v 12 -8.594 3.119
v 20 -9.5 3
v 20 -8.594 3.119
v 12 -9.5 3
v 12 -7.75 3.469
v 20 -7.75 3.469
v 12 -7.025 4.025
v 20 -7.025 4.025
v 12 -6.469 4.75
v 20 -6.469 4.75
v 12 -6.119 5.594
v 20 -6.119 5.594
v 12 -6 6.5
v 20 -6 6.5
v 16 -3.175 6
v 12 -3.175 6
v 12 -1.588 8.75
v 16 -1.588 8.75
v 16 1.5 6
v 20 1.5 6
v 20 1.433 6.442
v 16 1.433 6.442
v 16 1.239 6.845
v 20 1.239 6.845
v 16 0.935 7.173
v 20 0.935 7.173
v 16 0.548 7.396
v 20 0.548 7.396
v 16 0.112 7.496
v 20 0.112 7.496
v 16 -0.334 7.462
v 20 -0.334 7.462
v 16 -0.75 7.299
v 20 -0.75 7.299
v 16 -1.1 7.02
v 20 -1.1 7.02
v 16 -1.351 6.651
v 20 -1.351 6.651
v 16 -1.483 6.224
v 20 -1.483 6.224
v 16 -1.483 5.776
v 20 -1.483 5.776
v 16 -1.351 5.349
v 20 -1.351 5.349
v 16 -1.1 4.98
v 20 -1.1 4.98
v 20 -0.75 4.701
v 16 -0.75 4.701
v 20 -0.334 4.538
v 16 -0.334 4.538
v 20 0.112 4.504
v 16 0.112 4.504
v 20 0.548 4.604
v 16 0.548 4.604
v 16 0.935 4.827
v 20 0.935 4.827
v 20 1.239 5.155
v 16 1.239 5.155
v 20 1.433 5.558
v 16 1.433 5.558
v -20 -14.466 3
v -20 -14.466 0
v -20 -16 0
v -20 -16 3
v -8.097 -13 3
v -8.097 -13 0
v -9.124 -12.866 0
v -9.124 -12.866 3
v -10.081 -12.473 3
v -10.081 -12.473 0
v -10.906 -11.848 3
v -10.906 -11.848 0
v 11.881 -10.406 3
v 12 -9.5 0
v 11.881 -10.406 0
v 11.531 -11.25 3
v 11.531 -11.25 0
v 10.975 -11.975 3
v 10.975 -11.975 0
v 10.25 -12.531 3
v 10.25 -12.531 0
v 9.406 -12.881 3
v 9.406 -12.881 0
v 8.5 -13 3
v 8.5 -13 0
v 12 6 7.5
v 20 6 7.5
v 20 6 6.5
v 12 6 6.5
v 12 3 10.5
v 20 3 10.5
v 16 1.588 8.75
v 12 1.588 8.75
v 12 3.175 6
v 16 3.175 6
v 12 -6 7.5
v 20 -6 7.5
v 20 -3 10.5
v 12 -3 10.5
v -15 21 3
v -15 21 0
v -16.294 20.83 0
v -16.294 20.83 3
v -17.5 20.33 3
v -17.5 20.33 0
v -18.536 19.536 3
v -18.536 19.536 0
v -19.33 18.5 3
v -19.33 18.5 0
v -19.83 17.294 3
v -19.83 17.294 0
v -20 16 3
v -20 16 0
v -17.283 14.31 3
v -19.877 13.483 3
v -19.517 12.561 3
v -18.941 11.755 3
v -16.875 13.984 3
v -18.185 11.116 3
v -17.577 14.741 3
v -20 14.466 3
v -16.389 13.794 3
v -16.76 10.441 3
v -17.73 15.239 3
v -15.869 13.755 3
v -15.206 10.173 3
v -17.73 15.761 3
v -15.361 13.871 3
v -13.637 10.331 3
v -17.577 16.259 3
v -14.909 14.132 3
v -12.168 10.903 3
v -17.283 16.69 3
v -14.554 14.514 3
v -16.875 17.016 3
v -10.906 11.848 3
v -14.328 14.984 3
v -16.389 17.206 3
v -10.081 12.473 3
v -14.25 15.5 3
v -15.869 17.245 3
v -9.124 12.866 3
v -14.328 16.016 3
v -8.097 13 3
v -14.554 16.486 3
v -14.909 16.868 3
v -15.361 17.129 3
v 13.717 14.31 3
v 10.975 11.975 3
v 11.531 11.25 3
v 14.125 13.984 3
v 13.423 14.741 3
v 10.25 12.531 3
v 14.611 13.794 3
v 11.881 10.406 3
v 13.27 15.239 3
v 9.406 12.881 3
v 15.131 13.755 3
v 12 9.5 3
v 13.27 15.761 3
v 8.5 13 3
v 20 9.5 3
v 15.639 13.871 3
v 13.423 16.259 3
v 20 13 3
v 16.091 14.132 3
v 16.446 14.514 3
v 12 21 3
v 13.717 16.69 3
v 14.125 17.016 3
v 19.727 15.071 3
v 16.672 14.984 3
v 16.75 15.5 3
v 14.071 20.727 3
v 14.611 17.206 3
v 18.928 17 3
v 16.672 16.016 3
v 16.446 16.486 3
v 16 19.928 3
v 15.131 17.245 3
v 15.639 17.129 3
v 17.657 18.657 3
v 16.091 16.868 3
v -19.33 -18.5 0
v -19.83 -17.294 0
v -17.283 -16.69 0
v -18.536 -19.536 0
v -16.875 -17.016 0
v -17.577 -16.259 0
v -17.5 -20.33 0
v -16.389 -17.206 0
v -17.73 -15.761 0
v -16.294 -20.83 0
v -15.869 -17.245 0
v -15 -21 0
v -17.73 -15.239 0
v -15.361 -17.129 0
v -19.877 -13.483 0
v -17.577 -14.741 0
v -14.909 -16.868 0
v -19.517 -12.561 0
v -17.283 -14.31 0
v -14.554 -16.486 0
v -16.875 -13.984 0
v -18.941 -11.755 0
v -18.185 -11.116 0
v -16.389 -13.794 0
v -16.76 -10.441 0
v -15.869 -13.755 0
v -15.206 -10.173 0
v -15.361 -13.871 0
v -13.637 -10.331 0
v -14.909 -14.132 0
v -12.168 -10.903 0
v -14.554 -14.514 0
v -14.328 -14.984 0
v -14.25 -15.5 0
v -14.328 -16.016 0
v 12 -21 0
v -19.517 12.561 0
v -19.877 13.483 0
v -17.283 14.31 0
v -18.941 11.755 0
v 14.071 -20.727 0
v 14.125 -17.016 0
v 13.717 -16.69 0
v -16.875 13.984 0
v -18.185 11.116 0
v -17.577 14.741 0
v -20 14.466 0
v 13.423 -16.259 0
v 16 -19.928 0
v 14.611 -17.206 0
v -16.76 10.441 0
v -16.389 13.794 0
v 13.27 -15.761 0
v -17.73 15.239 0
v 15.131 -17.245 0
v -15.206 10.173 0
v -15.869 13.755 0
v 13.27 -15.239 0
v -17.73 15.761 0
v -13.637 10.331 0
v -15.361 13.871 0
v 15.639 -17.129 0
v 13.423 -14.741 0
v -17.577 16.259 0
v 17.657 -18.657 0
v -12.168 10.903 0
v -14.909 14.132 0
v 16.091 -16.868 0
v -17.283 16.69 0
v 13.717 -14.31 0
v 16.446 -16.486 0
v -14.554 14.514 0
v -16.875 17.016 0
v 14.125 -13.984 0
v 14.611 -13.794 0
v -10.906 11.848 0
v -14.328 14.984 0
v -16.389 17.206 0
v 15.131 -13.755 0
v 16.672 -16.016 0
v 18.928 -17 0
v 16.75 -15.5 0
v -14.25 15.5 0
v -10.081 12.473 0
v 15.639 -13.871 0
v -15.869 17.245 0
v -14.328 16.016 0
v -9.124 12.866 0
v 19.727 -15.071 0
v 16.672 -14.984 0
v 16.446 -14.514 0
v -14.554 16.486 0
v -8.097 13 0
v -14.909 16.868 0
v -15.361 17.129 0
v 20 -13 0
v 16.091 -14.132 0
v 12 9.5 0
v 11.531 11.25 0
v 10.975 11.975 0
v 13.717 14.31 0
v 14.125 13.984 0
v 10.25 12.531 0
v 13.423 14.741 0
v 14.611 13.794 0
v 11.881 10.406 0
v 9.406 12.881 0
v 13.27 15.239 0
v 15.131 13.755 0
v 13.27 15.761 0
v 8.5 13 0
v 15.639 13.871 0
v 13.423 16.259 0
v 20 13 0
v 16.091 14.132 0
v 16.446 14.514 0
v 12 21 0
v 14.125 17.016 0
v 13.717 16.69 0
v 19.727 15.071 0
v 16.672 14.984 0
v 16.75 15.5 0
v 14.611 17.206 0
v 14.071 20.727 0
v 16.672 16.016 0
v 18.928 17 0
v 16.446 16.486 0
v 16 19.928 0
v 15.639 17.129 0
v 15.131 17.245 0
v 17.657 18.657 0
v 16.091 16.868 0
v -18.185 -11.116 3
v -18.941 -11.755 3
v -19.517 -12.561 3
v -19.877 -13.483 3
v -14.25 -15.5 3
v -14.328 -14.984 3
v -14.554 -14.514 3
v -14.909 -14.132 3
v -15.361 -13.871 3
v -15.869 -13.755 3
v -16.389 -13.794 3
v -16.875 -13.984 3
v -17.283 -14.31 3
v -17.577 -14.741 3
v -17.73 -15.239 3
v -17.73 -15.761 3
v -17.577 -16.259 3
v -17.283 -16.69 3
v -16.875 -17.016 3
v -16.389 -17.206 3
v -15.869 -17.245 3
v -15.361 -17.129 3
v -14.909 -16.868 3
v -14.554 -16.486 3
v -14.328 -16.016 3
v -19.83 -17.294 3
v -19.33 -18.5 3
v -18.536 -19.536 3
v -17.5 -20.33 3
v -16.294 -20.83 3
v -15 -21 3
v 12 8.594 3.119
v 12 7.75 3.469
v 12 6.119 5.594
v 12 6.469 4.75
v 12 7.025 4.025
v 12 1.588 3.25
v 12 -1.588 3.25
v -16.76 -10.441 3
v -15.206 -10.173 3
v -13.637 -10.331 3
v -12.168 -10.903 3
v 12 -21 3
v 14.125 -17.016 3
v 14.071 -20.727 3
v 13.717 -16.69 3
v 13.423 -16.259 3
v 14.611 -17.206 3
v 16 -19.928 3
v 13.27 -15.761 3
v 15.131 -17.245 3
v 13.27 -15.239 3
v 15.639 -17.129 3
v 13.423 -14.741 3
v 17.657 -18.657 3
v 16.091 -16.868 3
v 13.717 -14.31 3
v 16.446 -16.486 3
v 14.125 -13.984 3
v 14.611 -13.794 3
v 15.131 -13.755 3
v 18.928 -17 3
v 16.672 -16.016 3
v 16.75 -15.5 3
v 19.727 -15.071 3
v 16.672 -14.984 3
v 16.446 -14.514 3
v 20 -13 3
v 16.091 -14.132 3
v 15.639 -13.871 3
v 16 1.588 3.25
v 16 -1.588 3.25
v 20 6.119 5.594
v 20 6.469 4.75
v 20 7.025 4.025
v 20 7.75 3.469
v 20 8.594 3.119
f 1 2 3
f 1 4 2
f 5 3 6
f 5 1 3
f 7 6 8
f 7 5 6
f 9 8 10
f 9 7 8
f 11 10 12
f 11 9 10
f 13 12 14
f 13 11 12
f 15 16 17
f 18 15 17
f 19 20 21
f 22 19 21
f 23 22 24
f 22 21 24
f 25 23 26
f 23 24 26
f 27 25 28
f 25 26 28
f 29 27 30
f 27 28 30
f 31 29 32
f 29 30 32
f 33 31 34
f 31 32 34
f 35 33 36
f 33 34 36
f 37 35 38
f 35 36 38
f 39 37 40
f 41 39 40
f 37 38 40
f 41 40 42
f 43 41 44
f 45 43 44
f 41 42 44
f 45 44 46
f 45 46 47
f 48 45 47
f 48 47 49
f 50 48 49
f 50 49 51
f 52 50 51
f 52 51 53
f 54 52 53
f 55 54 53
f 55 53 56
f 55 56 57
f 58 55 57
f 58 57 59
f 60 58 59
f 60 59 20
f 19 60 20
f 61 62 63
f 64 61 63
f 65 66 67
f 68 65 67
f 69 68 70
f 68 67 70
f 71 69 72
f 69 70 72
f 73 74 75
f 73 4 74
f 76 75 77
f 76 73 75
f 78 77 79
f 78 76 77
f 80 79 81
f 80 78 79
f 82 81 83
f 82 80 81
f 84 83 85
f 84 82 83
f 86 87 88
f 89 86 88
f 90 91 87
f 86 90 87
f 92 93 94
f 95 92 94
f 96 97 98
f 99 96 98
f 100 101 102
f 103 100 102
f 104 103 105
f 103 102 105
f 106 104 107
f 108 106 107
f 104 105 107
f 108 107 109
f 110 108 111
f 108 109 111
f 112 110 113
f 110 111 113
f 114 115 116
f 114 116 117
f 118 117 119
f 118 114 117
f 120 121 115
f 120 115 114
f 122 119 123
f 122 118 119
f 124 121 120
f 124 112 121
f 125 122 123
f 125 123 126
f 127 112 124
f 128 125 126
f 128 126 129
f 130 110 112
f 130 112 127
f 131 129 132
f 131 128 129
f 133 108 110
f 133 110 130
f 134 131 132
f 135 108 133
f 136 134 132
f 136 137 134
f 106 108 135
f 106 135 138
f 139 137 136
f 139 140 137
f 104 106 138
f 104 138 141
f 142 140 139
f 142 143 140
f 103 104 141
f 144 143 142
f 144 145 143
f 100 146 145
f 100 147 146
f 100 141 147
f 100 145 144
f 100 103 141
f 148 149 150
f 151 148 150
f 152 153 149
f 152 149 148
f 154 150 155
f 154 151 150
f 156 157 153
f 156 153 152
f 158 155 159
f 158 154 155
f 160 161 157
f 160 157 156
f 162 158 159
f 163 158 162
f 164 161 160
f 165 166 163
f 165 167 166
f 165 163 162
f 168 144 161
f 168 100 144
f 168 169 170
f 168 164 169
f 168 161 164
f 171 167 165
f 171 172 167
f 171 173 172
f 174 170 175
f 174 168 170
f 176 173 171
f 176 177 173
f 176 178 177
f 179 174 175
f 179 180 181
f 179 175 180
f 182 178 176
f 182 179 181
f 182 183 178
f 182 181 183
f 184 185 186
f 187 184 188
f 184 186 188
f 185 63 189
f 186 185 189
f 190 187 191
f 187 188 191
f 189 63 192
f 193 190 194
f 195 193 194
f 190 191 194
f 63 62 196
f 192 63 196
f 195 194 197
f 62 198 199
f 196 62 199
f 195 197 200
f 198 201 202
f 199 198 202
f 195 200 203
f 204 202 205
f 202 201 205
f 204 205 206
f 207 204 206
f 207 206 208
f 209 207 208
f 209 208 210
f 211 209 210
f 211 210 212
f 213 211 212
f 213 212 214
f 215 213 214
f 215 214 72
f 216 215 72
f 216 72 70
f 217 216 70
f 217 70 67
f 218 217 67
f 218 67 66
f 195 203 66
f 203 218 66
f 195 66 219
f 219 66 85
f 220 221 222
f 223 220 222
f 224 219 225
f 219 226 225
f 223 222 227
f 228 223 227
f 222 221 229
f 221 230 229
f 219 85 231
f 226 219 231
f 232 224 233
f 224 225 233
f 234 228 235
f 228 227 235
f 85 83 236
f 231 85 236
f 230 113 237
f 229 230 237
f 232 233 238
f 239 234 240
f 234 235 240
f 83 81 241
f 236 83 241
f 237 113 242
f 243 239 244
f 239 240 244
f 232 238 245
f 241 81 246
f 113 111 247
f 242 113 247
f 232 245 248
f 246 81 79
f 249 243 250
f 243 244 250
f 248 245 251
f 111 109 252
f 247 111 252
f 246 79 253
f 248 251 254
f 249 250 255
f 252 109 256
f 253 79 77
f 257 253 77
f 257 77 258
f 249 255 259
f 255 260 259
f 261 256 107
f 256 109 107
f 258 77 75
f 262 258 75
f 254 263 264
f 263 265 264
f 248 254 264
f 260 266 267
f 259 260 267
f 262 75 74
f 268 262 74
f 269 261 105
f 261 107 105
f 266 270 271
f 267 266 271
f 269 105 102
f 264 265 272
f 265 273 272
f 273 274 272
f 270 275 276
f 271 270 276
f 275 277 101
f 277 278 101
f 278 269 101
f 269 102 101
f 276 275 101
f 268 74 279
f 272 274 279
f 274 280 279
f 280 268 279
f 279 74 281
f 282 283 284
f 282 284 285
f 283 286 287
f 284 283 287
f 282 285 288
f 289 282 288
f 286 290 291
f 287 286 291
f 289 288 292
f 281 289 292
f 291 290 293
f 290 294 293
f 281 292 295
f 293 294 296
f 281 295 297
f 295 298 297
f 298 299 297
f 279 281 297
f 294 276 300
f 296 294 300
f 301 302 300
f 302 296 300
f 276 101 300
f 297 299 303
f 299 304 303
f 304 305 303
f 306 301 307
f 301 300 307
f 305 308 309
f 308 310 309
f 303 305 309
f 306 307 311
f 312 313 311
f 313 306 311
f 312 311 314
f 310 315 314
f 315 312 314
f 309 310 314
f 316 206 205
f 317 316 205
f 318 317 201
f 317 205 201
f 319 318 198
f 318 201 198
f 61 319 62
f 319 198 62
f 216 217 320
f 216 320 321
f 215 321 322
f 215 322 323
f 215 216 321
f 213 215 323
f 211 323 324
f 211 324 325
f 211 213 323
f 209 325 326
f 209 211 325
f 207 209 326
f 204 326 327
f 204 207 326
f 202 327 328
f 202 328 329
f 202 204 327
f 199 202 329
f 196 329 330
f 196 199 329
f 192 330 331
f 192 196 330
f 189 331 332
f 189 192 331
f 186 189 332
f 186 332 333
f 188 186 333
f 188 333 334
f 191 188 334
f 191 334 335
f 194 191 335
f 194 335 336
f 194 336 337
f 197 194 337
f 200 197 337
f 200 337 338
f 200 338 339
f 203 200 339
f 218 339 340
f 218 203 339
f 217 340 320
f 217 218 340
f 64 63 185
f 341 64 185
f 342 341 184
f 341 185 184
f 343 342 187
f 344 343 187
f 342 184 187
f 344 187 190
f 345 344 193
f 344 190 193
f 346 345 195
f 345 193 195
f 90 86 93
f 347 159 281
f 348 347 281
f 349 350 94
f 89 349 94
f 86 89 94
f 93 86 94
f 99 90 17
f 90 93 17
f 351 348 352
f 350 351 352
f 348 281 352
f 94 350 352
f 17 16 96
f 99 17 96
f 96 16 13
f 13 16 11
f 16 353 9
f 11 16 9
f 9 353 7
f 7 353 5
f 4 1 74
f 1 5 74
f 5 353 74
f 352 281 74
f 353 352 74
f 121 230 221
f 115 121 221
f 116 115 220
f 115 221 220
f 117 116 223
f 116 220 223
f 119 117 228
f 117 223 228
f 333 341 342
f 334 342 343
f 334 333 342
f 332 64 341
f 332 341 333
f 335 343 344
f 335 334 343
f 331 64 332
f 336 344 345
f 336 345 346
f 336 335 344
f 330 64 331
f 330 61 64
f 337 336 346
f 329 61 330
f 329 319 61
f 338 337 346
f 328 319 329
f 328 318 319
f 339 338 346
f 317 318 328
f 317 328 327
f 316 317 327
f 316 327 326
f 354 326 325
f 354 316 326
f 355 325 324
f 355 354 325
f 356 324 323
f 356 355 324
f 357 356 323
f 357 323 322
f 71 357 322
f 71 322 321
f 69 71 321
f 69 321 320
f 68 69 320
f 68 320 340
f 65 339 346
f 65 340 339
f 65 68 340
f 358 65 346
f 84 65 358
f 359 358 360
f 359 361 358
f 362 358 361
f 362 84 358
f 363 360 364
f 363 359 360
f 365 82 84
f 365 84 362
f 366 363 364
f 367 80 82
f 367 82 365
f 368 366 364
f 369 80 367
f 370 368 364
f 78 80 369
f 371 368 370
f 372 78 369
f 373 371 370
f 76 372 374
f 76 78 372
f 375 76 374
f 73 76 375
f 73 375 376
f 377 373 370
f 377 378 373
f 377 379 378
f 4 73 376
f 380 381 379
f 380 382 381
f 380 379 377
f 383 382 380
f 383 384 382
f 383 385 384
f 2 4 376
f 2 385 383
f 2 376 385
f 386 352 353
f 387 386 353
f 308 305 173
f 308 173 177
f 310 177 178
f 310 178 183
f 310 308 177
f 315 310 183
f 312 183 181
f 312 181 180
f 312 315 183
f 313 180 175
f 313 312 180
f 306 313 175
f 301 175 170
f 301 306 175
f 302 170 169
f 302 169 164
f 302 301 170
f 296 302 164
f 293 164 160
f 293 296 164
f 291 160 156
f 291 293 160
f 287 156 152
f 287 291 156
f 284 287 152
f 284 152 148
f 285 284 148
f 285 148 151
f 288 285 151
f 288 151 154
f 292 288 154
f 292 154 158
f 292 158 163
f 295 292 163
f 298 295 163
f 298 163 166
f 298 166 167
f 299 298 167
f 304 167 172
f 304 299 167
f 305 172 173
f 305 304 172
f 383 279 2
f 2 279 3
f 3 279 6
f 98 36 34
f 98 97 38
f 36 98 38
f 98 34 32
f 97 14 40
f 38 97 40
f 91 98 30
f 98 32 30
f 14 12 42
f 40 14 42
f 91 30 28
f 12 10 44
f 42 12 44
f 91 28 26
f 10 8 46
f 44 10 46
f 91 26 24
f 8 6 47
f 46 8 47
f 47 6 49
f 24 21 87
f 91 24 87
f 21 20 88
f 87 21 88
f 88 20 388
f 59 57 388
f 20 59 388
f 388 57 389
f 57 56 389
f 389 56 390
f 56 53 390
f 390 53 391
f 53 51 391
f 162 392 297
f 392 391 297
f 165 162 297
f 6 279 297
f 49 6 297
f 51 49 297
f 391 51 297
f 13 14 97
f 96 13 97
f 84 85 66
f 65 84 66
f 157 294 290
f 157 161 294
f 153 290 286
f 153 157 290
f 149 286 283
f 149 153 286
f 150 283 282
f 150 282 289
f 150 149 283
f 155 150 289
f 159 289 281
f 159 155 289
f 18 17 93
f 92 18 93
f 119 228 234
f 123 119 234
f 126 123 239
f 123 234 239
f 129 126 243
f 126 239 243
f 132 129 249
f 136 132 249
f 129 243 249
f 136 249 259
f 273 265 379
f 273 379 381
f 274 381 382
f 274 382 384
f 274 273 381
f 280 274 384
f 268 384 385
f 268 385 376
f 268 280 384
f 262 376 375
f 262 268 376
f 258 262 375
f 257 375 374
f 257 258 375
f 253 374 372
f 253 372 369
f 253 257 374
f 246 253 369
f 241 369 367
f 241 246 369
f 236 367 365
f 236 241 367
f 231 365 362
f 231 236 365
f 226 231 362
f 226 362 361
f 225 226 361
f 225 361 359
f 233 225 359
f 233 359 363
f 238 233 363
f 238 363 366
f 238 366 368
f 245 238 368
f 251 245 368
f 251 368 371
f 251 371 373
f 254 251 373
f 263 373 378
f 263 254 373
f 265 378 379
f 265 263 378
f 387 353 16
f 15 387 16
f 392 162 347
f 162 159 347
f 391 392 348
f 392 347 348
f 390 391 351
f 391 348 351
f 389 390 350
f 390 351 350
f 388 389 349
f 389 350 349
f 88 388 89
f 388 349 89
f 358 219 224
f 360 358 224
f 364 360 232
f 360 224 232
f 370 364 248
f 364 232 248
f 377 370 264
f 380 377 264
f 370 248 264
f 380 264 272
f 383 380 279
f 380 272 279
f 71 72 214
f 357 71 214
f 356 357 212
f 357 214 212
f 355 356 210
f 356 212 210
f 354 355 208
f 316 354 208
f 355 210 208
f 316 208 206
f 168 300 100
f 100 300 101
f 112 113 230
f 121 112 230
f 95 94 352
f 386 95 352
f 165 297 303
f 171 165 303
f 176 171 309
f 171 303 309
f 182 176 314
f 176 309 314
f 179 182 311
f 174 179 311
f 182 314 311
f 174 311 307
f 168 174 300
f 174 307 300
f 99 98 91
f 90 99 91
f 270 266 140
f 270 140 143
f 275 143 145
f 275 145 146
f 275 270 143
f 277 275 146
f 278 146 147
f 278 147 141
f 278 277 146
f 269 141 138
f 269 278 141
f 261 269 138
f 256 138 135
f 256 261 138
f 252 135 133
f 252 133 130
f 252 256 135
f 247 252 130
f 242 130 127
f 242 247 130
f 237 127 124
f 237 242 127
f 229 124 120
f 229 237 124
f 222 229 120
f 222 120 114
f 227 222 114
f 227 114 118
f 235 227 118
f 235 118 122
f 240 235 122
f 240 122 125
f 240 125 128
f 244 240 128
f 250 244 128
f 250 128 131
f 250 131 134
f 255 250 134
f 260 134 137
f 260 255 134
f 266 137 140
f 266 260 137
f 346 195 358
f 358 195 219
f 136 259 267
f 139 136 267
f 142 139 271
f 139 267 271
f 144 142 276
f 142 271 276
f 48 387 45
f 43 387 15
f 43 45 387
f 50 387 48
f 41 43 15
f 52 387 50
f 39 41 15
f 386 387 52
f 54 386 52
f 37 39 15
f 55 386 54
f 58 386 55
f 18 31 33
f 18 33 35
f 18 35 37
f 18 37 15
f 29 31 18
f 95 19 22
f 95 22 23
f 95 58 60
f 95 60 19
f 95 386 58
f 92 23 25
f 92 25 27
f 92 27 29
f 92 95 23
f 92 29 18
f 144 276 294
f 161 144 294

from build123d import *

# Parameters (mm, degrees)
SKETCH1_R           = 1.75
BOSS_EXTRUDE1_DEPTH = 3
SKETCH2_R           = 1.5
BOSS_EXTRUDE2_DEPTH = 8
FILLET1_R           = 3.5
CUT_EXTRUDE1_DEPTH  = 4


with BuildPart() as part:
    # Sketch1 → Boss-Extrude1 (new body)
    with BuildSketch(Plane.XY):
        with BuildLine():
            Line((-20, 16), (-20, 14.466251376))
            ThreePointArc((-20, 14.466251376), (-19.517003263, 12.560814931), (-18.184655977, 11.115538278))
            ThreePointArc((-18.184655977, 11.115538278), (-14.41606767, 10.198360315), (-10.905843198, 11.848147392))
            ThreePointArc((-10.905843198, 11.848147392), (-9.615070973, 12.700850549), (-8.097274802, 13))
            Line((-8.097274802, 13), (12, 13))
            Line((12, 13), (12, -13))
            Line((12, -13), (-8.097274802, -13))
            ThreePointArc((-8.097274802, -13), (-9.615070973, -12.700850549), (-10.905843198, -11.848147392))
            ThreePointArc((-10.905843198, -11.848147392), (-14.41606767, -10.198360315), (-18.184655977, -11.115538278))
            ThreePointArc((-18.184655977, -11.115538278), (-19.517003263, -12.560814931), (-20, -14.466251376))
            Line((-20, -14.466251376), (-20, -16))
            ThreePointArc((-20, -16), (-18.535533906, -19.535533906), (-15, -21))
            Line((-15, -21), (12, -21))
            ThreePointArc((12, -21), (17.656854249, -18.656854249), (20, -13))
            Line((20, -13), (20, 13))
            ThreePointArc((20, 13), (17.656854249, 18.656854249), (12, 21))
            Line((12, 21), (-15, 21))
            ThreePointArc((-15, 21), (-18.535533906, 19.535533906), (-20, 16))
        make_face()
        with Locations((15, 15.5)):
            Circle(SKETCH1_R, mode=Mode.SUBTRACT)
        with Locations((15, -15.5)):
            Circle(SKETCH1_R, mode=Mode.SUBTRACT)
        with Locations((-16, -15.5)):
            Circle(SKETCH1_R, mode=Mode.SUBTRACT)
        with Locations((-16, 15.5)):
            Circle(SKETCH1_R, mode=Mode.SUBTRACT)
    extrude(amount=BOSS_EXTRUDE1_DEPTH)

    # Sketch2 → Boss-Extrude2 (add)
    with BuildSketch(Plane(origin=(20, 0, 0), x_dir=(0, 0, -1), z_dir=(1, 0, 0))):
        Polygon((-10.5, 3), (-7.5, 6), (-3, 6), (-3, -6), (-7.5, -6), (-10.5, -3), align=None)
        with Locations(Location((-6, 0, 0), (0, 0, 90))):
            Circle(SKETCH2_R, mode=Mode.SUBTRACT)
    extrude(amount=-BOSS_EXTRUDE2_DEPTH)

    # Fillet1
    fillet1_edges = [part.edges().sort_by_distance(p)[0] for p in [
        (16, 6, 3),
        (16, -6, 3),
        (12, -13, 1.5),
        (12, 13, 1.5),
    ]]
    fillet(fillet1_edges, radius=FILLET1_R - 0.0001)  # a hair under: the kernel refuses the full size

    # Sketch3 → Cut-Extrude1 (cut)
    with BuildSketch(Plane.ZY.offset(-12)):
        Polygon((6, 3.175426481), (3.25, 1.58771324), (3.25, -1.58771324), (6, -3.175426481), (8.75, -1.58771324), (8.75, 1.58771324), align=None)
    extrude(amount=-CUT_EXTRUDE1_DEPTH, mode=Mode.SUBTRACT)


solid = part.part
